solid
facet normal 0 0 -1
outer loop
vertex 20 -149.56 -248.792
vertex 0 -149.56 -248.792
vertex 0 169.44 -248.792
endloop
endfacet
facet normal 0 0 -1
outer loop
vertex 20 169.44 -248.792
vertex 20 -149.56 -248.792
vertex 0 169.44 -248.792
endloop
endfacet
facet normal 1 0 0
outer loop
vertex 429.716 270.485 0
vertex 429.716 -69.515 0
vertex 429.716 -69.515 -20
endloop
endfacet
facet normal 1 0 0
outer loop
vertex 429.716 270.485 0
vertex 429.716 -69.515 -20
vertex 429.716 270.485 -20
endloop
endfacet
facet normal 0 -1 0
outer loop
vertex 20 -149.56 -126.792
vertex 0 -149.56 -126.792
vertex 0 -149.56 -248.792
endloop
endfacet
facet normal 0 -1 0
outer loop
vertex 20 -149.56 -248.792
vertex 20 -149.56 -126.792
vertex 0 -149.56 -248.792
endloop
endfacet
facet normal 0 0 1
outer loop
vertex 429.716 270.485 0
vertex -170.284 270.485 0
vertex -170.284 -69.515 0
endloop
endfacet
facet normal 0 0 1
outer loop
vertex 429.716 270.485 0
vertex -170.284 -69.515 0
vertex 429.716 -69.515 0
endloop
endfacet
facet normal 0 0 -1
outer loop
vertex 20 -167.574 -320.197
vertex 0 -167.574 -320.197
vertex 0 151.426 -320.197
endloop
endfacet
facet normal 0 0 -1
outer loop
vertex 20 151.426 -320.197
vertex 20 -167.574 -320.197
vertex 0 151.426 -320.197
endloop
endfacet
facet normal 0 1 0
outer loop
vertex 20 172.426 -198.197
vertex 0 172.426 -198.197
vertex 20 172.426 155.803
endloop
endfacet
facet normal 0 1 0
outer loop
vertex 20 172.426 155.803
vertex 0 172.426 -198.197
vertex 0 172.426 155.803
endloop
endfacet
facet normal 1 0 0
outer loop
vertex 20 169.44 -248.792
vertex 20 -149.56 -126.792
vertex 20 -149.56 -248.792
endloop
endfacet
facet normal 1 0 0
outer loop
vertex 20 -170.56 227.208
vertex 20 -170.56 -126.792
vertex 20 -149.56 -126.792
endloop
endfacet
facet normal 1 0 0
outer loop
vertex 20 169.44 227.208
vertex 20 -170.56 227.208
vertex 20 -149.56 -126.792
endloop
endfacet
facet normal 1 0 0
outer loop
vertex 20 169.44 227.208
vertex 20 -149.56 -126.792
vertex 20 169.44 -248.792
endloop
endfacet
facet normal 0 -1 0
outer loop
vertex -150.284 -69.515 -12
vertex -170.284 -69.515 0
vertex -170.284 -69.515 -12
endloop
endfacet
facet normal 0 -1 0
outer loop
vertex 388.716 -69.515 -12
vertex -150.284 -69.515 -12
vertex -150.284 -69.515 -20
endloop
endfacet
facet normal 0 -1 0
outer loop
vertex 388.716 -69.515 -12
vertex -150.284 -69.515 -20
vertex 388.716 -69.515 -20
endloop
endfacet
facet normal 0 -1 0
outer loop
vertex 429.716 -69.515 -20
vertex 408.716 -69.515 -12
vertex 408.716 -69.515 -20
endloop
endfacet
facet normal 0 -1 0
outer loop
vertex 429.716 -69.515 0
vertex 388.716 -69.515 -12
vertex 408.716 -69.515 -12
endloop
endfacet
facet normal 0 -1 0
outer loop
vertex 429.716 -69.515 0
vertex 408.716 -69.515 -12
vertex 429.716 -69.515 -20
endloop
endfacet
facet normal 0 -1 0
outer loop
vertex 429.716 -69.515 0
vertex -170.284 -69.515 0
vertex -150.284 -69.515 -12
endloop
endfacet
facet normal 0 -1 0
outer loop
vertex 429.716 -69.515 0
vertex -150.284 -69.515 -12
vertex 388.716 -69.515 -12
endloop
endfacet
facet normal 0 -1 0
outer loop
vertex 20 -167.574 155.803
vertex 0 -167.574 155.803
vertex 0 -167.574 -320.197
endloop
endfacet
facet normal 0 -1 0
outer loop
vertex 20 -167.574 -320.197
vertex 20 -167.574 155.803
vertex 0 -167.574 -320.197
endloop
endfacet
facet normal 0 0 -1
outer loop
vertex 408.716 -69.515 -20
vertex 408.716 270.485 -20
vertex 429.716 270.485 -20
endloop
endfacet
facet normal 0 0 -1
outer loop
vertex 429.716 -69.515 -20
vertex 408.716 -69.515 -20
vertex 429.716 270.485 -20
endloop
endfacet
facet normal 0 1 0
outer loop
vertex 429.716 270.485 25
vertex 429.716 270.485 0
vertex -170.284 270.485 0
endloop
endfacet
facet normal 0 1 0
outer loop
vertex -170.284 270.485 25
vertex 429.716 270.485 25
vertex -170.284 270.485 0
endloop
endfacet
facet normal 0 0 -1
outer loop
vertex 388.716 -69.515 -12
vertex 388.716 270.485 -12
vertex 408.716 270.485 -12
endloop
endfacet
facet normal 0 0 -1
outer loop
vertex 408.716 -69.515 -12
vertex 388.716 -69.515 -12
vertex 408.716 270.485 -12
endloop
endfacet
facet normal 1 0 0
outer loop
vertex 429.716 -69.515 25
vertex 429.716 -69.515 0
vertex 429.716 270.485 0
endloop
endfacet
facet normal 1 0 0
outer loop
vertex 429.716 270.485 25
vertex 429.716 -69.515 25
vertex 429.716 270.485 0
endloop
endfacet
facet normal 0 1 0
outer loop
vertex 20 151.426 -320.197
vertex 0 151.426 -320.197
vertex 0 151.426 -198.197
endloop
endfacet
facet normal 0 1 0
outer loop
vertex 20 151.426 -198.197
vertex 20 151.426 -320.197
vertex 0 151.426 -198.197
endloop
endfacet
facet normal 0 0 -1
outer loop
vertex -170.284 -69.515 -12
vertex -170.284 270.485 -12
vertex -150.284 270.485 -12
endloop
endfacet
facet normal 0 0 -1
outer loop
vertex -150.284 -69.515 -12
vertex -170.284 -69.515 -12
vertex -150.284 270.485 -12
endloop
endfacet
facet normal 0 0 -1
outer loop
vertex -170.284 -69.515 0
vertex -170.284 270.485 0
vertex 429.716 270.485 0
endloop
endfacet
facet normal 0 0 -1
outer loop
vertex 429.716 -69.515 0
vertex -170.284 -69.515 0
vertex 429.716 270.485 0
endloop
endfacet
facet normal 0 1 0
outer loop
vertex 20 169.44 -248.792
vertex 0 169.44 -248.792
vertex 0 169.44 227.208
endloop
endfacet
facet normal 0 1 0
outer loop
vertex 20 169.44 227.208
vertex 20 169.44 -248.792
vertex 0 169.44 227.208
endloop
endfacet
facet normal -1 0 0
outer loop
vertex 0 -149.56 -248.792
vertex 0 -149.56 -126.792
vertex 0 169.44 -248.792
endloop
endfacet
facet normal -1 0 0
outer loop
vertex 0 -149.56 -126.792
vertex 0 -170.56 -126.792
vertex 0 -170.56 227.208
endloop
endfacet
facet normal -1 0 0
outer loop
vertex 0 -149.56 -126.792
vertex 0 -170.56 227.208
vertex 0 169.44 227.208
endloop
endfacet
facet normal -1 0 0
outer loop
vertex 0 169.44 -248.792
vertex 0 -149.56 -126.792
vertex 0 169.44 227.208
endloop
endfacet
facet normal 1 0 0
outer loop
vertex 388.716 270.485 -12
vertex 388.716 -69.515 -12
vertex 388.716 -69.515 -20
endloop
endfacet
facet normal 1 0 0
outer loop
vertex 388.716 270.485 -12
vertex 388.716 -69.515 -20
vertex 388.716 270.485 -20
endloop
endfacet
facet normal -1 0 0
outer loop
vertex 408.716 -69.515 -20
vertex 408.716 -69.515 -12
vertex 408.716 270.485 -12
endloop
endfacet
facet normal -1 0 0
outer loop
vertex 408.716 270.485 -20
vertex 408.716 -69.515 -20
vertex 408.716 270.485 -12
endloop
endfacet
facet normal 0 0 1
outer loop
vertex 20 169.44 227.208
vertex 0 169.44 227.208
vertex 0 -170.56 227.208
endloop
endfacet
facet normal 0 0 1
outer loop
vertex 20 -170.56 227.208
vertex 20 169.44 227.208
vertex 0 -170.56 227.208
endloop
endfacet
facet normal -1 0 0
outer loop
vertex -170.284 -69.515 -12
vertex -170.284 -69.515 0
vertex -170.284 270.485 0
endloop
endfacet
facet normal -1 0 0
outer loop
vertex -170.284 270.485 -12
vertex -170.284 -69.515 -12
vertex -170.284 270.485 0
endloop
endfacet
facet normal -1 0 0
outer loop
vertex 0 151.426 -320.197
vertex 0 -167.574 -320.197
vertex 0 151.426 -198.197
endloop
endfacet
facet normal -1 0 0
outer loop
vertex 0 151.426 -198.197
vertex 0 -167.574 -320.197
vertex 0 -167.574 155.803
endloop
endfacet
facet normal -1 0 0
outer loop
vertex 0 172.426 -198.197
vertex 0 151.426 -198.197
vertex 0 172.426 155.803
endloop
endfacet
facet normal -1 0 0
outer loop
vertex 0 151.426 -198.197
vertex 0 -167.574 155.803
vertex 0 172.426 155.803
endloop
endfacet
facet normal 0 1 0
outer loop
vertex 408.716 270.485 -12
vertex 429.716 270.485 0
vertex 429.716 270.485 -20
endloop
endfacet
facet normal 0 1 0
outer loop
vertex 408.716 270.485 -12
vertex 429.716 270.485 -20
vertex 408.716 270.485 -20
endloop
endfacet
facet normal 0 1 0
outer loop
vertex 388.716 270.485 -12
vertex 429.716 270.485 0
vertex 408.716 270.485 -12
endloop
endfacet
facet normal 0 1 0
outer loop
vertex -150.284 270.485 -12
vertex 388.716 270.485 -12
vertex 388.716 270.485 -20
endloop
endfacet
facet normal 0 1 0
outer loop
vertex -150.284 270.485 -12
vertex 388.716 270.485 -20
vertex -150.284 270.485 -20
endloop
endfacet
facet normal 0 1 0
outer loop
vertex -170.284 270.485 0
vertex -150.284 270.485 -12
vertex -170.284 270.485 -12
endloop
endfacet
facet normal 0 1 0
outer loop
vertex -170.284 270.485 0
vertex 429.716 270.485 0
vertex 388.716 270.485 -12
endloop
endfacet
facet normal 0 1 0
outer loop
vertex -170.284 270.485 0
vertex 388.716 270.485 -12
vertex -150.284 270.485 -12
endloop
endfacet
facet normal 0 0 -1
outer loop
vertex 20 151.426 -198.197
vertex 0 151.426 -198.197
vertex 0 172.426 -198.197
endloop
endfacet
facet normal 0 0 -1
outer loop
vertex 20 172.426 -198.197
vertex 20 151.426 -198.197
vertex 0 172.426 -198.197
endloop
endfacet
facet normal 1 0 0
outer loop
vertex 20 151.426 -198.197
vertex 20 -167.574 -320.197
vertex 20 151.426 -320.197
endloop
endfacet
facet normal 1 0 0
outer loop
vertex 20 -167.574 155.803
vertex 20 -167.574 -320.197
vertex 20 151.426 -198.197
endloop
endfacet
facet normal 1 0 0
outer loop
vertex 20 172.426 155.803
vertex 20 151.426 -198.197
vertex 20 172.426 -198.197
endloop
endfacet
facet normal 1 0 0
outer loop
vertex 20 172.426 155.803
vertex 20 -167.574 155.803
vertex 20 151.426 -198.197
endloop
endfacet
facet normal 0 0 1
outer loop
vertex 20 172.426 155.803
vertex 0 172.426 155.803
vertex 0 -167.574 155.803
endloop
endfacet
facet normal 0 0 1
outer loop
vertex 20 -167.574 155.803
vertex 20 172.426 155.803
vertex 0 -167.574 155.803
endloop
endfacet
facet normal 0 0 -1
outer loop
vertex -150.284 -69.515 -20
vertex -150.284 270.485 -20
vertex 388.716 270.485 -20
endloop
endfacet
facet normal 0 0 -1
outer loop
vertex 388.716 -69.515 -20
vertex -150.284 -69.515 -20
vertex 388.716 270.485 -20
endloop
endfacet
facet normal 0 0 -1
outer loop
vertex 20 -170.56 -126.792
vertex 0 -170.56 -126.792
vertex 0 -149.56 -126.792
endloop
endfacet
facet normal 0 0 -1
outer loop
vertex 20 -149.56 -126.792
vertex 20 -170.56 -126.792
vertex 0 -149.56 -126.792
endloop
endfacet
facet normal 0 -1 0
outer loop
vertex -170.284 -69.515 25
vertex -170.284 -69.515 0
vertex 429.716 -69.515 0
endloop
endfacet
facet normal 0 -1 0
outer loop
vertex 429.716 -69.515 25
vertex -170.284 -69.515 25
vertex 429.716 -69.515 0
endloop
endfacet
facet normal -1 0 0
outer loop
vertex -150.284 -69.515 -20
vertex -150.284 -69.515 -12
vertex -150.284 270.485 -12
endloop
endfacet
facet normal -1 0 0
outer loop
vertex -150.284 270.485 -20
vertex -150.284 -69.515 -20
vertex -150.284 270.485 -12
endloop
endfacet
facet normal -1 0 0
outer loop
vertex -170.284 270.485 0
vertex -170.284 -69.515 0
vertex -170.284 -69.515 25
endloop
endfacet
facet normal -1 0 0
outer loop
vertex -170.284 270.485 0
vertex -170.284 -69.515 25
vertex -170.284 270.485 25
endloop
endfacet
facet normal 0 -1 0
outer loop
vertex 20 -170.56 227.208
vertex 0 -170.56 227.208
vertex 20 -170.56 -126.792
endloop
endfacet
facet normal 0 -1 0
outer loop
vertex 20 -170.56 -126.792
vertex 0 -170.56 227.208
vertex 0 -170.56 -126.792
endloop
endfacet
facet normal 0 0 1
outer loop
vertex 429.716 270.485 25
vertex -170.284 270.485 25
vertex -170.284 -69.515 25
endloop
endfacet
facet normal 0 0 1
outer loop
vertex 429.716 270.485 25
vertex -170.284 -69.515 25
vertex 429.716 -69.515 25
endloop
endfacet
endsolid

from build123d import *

# Parameters (mm, degrees)
F2_W     = 20
F2_H     = 340
F2_W_2   = 539
F2_W_3   = 21
F3_DEPTH = 20
F4_START = -12
F4_DEPTH = 8
F6_DEPTH = 20
F8_DEPTH = 20
F9_DEPTH = 25


with BuildPart() as f3:
    # F2 (on Top) → F3 (new body)
    with BuildSketch(Plane.XY):
        with Locations((-160.284396112, 100.4845837683)):
            Rectangle(F2_W, F2_H)
        with Locations((119.215603888, 100.4845837683)):
            Rectangle(F2_W_2, F2_H)
        with Locations((398.715603888, 100.4845837683)):
            Rectangle(F2_W, F2_H)
        with Locations((419.215603888, 100.4845837683)):
            Rectangle(F2_W_3, F2_H)
    extrude(amount=-F3_DEPTH)

    # F2 (on Top) → F4 (cut)
    with BuildSketch(Plane.XY.offset(F4_START)):
        with Locations((-160.284396112, 100.4845837683)):
            Rectangle(F2_W, F2_H)
        with Locations((398.715603888, 100.4845837683)):
            Rectangle(F2_W, F2_H)
    extrude(amount=-F4_DEPTH, mode=Mode.SUBTRACT)


with BuildPart() as f6:
    # F5 (on Right) → F6 (new body)
    with BuildSketch(Plane.YZ):
        Polygon((172.4259472266, -198.1971520801), (172.4259472266, 155.8028479199), (-167.5740527734, 155.8028479199), (-167.5740527734, -198.1971520801), (-167.5740527734, -320.1971520801), (-146.5740527734, -320.1971520801), (151.4259472266, -320.1971520801), (151.4259472266, -198.1971520801), align=None)
    extrude(amount=F6_DEPTH)


with BuildPart() as f8:
    # F7 (on Right) → F8 (new body)
    with BuildSketch(Plane.YZ):
        Polygon((169.4401661679, 227.2081043864), (-170.5598338321, 227.2081043864), (-170.5598338321, -126.7918956136), (-149.5598338321, -126.7918956136), (-149.5598338321, -248.7918956136), (169.4401661679, -248.7918956136), align=None)
    extrude(amount=F8_DEPTH)


with BuildPart() as f9:
    # F2 (on Top) → F9 (new body)
    with BuildSketch(Plane.XY):
        with Locations((-160.284396112, 100.4845837683)):
            Rectangle(F2_W, F2_H)
        with Locations((119.215603888, 100.4845837683)):
            Rectangle(F2_W_2, F2_H)
        with Locations((398.715603888, 100.4845837683)):
            Rectangle(F2_W, F2_H)
        with Locations((419.215603888, 100.4845837683)):
            Rectangle(F2_W_3, F2_H)
    extrude(amount=F9_DEPTH)


solid = Compound([f3.part, f6.part, f8.part, f9.part])
